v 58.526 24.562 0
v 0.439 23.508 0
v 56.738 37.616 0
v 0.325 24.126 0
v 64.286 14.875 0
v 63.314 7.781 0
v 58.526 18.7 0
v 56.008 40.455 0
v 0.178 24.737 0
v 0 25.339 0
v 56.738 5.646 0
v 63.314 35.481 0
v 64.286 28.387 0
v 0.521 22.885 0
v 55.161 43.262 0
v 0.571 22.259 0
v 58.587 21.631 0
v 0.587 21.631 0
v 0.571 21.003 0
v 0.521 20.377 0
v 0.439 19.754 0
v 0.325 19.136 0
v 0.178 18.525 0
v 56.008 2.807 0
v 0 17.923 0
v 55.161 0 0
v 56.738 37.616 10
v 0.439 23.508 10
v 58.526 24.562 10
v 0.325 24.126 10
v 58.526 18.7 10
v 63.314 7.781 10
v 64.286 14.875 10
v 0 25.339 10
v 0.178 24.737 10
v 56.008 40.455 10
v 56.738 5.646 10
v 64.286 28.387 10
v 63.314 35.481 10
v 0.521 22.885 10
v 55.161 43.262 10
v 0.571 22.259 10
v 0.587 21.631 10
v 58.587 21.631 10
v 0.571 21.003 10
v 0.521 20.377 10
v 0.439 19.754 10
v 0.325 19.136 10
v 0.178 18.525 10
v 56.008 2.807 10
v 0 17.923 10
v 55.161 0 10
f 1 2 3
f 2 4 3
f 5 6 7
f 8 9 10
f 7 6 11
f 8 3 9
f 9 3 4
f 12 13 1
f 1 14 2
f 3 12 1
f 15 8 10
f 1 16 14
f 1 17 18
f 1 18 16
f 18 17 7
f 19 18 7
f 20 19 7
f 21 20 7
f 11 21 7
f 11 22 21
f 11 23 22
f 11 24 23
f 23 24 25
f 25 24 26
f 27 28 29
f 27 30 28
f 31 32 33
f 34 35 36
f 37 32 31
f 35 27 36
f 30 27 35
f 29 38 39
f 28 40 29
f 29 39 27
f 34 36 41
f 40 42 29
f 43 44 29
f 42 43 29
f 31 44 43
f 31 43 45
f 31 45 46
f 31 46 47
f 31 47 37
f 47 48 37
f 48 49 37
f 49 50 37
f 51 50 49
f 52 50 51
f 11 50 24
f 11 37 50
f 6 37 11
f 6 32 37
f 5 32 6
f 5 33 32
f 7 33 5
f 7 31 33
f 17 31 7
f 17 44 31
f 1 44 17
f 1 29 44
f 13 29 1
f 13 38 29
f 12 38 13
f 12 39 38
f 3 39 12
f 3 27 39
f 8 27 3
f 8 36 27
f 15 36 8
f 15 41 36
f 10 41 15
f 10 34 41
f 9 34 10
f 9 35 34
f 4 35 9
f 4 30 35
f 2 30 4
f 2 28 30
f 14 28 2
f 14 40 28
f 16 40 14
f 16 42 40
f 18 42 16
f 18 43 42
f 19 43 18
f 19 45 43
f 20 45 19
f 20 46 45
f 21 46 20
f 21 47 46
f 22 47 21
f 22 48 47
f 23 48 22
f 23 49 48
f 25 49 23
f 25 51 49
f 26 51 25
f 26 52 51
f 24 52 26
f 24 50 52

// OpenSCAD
$fn = 32;

// ----------------------------------------------------------------------
// Gear sector: 2 teeth on 36 degrees
// ----------------------------------------------------------------------

// --- parameters (mm) ---
sector_angle = 36;        // sector angle, degrees
root_r = 70;              // root circle radius
tooth_h = 6;              // tooth height over the root circle
teeth = 2;                // number of teeth on the sector
hub_r = 12;               // hub bore radius
plate_t = 10;             // sector thickness, Z
arc_step = 3;             // sampling step of the root/hub arcs, degrees

tip_r = root_r + tooth_h;  // tip circle radius

profile = [[55.161, 0], [56.008, 2.807], [56.738, 5.646], [63.314, 7.781], [64.286, 14.875], [58.526, 18.7], [58.587, 21.631], [58.526, 24.562], [64.286, 28.387], [63.314, 35.481], [56.738, 37.616], [56.008, 40.455], [55.161, 43.262], [0, 25.339], [0.178, 24.737], [0.325, 24.126], [0.439, 23.508], [0.521, 22.885], [0.571, 22.259], [0.587, 21.631], [0.571, 21.003], [0.521, 20.377], [0.439, 19.754], [0.325, 19.136], [0.178, 18.525], [0, 17.923]];  // primary outline, 26 points, counter clockwise

// --- the one profile operation ---
linear_extrude(height = plate_t) polygon(points = profile);
